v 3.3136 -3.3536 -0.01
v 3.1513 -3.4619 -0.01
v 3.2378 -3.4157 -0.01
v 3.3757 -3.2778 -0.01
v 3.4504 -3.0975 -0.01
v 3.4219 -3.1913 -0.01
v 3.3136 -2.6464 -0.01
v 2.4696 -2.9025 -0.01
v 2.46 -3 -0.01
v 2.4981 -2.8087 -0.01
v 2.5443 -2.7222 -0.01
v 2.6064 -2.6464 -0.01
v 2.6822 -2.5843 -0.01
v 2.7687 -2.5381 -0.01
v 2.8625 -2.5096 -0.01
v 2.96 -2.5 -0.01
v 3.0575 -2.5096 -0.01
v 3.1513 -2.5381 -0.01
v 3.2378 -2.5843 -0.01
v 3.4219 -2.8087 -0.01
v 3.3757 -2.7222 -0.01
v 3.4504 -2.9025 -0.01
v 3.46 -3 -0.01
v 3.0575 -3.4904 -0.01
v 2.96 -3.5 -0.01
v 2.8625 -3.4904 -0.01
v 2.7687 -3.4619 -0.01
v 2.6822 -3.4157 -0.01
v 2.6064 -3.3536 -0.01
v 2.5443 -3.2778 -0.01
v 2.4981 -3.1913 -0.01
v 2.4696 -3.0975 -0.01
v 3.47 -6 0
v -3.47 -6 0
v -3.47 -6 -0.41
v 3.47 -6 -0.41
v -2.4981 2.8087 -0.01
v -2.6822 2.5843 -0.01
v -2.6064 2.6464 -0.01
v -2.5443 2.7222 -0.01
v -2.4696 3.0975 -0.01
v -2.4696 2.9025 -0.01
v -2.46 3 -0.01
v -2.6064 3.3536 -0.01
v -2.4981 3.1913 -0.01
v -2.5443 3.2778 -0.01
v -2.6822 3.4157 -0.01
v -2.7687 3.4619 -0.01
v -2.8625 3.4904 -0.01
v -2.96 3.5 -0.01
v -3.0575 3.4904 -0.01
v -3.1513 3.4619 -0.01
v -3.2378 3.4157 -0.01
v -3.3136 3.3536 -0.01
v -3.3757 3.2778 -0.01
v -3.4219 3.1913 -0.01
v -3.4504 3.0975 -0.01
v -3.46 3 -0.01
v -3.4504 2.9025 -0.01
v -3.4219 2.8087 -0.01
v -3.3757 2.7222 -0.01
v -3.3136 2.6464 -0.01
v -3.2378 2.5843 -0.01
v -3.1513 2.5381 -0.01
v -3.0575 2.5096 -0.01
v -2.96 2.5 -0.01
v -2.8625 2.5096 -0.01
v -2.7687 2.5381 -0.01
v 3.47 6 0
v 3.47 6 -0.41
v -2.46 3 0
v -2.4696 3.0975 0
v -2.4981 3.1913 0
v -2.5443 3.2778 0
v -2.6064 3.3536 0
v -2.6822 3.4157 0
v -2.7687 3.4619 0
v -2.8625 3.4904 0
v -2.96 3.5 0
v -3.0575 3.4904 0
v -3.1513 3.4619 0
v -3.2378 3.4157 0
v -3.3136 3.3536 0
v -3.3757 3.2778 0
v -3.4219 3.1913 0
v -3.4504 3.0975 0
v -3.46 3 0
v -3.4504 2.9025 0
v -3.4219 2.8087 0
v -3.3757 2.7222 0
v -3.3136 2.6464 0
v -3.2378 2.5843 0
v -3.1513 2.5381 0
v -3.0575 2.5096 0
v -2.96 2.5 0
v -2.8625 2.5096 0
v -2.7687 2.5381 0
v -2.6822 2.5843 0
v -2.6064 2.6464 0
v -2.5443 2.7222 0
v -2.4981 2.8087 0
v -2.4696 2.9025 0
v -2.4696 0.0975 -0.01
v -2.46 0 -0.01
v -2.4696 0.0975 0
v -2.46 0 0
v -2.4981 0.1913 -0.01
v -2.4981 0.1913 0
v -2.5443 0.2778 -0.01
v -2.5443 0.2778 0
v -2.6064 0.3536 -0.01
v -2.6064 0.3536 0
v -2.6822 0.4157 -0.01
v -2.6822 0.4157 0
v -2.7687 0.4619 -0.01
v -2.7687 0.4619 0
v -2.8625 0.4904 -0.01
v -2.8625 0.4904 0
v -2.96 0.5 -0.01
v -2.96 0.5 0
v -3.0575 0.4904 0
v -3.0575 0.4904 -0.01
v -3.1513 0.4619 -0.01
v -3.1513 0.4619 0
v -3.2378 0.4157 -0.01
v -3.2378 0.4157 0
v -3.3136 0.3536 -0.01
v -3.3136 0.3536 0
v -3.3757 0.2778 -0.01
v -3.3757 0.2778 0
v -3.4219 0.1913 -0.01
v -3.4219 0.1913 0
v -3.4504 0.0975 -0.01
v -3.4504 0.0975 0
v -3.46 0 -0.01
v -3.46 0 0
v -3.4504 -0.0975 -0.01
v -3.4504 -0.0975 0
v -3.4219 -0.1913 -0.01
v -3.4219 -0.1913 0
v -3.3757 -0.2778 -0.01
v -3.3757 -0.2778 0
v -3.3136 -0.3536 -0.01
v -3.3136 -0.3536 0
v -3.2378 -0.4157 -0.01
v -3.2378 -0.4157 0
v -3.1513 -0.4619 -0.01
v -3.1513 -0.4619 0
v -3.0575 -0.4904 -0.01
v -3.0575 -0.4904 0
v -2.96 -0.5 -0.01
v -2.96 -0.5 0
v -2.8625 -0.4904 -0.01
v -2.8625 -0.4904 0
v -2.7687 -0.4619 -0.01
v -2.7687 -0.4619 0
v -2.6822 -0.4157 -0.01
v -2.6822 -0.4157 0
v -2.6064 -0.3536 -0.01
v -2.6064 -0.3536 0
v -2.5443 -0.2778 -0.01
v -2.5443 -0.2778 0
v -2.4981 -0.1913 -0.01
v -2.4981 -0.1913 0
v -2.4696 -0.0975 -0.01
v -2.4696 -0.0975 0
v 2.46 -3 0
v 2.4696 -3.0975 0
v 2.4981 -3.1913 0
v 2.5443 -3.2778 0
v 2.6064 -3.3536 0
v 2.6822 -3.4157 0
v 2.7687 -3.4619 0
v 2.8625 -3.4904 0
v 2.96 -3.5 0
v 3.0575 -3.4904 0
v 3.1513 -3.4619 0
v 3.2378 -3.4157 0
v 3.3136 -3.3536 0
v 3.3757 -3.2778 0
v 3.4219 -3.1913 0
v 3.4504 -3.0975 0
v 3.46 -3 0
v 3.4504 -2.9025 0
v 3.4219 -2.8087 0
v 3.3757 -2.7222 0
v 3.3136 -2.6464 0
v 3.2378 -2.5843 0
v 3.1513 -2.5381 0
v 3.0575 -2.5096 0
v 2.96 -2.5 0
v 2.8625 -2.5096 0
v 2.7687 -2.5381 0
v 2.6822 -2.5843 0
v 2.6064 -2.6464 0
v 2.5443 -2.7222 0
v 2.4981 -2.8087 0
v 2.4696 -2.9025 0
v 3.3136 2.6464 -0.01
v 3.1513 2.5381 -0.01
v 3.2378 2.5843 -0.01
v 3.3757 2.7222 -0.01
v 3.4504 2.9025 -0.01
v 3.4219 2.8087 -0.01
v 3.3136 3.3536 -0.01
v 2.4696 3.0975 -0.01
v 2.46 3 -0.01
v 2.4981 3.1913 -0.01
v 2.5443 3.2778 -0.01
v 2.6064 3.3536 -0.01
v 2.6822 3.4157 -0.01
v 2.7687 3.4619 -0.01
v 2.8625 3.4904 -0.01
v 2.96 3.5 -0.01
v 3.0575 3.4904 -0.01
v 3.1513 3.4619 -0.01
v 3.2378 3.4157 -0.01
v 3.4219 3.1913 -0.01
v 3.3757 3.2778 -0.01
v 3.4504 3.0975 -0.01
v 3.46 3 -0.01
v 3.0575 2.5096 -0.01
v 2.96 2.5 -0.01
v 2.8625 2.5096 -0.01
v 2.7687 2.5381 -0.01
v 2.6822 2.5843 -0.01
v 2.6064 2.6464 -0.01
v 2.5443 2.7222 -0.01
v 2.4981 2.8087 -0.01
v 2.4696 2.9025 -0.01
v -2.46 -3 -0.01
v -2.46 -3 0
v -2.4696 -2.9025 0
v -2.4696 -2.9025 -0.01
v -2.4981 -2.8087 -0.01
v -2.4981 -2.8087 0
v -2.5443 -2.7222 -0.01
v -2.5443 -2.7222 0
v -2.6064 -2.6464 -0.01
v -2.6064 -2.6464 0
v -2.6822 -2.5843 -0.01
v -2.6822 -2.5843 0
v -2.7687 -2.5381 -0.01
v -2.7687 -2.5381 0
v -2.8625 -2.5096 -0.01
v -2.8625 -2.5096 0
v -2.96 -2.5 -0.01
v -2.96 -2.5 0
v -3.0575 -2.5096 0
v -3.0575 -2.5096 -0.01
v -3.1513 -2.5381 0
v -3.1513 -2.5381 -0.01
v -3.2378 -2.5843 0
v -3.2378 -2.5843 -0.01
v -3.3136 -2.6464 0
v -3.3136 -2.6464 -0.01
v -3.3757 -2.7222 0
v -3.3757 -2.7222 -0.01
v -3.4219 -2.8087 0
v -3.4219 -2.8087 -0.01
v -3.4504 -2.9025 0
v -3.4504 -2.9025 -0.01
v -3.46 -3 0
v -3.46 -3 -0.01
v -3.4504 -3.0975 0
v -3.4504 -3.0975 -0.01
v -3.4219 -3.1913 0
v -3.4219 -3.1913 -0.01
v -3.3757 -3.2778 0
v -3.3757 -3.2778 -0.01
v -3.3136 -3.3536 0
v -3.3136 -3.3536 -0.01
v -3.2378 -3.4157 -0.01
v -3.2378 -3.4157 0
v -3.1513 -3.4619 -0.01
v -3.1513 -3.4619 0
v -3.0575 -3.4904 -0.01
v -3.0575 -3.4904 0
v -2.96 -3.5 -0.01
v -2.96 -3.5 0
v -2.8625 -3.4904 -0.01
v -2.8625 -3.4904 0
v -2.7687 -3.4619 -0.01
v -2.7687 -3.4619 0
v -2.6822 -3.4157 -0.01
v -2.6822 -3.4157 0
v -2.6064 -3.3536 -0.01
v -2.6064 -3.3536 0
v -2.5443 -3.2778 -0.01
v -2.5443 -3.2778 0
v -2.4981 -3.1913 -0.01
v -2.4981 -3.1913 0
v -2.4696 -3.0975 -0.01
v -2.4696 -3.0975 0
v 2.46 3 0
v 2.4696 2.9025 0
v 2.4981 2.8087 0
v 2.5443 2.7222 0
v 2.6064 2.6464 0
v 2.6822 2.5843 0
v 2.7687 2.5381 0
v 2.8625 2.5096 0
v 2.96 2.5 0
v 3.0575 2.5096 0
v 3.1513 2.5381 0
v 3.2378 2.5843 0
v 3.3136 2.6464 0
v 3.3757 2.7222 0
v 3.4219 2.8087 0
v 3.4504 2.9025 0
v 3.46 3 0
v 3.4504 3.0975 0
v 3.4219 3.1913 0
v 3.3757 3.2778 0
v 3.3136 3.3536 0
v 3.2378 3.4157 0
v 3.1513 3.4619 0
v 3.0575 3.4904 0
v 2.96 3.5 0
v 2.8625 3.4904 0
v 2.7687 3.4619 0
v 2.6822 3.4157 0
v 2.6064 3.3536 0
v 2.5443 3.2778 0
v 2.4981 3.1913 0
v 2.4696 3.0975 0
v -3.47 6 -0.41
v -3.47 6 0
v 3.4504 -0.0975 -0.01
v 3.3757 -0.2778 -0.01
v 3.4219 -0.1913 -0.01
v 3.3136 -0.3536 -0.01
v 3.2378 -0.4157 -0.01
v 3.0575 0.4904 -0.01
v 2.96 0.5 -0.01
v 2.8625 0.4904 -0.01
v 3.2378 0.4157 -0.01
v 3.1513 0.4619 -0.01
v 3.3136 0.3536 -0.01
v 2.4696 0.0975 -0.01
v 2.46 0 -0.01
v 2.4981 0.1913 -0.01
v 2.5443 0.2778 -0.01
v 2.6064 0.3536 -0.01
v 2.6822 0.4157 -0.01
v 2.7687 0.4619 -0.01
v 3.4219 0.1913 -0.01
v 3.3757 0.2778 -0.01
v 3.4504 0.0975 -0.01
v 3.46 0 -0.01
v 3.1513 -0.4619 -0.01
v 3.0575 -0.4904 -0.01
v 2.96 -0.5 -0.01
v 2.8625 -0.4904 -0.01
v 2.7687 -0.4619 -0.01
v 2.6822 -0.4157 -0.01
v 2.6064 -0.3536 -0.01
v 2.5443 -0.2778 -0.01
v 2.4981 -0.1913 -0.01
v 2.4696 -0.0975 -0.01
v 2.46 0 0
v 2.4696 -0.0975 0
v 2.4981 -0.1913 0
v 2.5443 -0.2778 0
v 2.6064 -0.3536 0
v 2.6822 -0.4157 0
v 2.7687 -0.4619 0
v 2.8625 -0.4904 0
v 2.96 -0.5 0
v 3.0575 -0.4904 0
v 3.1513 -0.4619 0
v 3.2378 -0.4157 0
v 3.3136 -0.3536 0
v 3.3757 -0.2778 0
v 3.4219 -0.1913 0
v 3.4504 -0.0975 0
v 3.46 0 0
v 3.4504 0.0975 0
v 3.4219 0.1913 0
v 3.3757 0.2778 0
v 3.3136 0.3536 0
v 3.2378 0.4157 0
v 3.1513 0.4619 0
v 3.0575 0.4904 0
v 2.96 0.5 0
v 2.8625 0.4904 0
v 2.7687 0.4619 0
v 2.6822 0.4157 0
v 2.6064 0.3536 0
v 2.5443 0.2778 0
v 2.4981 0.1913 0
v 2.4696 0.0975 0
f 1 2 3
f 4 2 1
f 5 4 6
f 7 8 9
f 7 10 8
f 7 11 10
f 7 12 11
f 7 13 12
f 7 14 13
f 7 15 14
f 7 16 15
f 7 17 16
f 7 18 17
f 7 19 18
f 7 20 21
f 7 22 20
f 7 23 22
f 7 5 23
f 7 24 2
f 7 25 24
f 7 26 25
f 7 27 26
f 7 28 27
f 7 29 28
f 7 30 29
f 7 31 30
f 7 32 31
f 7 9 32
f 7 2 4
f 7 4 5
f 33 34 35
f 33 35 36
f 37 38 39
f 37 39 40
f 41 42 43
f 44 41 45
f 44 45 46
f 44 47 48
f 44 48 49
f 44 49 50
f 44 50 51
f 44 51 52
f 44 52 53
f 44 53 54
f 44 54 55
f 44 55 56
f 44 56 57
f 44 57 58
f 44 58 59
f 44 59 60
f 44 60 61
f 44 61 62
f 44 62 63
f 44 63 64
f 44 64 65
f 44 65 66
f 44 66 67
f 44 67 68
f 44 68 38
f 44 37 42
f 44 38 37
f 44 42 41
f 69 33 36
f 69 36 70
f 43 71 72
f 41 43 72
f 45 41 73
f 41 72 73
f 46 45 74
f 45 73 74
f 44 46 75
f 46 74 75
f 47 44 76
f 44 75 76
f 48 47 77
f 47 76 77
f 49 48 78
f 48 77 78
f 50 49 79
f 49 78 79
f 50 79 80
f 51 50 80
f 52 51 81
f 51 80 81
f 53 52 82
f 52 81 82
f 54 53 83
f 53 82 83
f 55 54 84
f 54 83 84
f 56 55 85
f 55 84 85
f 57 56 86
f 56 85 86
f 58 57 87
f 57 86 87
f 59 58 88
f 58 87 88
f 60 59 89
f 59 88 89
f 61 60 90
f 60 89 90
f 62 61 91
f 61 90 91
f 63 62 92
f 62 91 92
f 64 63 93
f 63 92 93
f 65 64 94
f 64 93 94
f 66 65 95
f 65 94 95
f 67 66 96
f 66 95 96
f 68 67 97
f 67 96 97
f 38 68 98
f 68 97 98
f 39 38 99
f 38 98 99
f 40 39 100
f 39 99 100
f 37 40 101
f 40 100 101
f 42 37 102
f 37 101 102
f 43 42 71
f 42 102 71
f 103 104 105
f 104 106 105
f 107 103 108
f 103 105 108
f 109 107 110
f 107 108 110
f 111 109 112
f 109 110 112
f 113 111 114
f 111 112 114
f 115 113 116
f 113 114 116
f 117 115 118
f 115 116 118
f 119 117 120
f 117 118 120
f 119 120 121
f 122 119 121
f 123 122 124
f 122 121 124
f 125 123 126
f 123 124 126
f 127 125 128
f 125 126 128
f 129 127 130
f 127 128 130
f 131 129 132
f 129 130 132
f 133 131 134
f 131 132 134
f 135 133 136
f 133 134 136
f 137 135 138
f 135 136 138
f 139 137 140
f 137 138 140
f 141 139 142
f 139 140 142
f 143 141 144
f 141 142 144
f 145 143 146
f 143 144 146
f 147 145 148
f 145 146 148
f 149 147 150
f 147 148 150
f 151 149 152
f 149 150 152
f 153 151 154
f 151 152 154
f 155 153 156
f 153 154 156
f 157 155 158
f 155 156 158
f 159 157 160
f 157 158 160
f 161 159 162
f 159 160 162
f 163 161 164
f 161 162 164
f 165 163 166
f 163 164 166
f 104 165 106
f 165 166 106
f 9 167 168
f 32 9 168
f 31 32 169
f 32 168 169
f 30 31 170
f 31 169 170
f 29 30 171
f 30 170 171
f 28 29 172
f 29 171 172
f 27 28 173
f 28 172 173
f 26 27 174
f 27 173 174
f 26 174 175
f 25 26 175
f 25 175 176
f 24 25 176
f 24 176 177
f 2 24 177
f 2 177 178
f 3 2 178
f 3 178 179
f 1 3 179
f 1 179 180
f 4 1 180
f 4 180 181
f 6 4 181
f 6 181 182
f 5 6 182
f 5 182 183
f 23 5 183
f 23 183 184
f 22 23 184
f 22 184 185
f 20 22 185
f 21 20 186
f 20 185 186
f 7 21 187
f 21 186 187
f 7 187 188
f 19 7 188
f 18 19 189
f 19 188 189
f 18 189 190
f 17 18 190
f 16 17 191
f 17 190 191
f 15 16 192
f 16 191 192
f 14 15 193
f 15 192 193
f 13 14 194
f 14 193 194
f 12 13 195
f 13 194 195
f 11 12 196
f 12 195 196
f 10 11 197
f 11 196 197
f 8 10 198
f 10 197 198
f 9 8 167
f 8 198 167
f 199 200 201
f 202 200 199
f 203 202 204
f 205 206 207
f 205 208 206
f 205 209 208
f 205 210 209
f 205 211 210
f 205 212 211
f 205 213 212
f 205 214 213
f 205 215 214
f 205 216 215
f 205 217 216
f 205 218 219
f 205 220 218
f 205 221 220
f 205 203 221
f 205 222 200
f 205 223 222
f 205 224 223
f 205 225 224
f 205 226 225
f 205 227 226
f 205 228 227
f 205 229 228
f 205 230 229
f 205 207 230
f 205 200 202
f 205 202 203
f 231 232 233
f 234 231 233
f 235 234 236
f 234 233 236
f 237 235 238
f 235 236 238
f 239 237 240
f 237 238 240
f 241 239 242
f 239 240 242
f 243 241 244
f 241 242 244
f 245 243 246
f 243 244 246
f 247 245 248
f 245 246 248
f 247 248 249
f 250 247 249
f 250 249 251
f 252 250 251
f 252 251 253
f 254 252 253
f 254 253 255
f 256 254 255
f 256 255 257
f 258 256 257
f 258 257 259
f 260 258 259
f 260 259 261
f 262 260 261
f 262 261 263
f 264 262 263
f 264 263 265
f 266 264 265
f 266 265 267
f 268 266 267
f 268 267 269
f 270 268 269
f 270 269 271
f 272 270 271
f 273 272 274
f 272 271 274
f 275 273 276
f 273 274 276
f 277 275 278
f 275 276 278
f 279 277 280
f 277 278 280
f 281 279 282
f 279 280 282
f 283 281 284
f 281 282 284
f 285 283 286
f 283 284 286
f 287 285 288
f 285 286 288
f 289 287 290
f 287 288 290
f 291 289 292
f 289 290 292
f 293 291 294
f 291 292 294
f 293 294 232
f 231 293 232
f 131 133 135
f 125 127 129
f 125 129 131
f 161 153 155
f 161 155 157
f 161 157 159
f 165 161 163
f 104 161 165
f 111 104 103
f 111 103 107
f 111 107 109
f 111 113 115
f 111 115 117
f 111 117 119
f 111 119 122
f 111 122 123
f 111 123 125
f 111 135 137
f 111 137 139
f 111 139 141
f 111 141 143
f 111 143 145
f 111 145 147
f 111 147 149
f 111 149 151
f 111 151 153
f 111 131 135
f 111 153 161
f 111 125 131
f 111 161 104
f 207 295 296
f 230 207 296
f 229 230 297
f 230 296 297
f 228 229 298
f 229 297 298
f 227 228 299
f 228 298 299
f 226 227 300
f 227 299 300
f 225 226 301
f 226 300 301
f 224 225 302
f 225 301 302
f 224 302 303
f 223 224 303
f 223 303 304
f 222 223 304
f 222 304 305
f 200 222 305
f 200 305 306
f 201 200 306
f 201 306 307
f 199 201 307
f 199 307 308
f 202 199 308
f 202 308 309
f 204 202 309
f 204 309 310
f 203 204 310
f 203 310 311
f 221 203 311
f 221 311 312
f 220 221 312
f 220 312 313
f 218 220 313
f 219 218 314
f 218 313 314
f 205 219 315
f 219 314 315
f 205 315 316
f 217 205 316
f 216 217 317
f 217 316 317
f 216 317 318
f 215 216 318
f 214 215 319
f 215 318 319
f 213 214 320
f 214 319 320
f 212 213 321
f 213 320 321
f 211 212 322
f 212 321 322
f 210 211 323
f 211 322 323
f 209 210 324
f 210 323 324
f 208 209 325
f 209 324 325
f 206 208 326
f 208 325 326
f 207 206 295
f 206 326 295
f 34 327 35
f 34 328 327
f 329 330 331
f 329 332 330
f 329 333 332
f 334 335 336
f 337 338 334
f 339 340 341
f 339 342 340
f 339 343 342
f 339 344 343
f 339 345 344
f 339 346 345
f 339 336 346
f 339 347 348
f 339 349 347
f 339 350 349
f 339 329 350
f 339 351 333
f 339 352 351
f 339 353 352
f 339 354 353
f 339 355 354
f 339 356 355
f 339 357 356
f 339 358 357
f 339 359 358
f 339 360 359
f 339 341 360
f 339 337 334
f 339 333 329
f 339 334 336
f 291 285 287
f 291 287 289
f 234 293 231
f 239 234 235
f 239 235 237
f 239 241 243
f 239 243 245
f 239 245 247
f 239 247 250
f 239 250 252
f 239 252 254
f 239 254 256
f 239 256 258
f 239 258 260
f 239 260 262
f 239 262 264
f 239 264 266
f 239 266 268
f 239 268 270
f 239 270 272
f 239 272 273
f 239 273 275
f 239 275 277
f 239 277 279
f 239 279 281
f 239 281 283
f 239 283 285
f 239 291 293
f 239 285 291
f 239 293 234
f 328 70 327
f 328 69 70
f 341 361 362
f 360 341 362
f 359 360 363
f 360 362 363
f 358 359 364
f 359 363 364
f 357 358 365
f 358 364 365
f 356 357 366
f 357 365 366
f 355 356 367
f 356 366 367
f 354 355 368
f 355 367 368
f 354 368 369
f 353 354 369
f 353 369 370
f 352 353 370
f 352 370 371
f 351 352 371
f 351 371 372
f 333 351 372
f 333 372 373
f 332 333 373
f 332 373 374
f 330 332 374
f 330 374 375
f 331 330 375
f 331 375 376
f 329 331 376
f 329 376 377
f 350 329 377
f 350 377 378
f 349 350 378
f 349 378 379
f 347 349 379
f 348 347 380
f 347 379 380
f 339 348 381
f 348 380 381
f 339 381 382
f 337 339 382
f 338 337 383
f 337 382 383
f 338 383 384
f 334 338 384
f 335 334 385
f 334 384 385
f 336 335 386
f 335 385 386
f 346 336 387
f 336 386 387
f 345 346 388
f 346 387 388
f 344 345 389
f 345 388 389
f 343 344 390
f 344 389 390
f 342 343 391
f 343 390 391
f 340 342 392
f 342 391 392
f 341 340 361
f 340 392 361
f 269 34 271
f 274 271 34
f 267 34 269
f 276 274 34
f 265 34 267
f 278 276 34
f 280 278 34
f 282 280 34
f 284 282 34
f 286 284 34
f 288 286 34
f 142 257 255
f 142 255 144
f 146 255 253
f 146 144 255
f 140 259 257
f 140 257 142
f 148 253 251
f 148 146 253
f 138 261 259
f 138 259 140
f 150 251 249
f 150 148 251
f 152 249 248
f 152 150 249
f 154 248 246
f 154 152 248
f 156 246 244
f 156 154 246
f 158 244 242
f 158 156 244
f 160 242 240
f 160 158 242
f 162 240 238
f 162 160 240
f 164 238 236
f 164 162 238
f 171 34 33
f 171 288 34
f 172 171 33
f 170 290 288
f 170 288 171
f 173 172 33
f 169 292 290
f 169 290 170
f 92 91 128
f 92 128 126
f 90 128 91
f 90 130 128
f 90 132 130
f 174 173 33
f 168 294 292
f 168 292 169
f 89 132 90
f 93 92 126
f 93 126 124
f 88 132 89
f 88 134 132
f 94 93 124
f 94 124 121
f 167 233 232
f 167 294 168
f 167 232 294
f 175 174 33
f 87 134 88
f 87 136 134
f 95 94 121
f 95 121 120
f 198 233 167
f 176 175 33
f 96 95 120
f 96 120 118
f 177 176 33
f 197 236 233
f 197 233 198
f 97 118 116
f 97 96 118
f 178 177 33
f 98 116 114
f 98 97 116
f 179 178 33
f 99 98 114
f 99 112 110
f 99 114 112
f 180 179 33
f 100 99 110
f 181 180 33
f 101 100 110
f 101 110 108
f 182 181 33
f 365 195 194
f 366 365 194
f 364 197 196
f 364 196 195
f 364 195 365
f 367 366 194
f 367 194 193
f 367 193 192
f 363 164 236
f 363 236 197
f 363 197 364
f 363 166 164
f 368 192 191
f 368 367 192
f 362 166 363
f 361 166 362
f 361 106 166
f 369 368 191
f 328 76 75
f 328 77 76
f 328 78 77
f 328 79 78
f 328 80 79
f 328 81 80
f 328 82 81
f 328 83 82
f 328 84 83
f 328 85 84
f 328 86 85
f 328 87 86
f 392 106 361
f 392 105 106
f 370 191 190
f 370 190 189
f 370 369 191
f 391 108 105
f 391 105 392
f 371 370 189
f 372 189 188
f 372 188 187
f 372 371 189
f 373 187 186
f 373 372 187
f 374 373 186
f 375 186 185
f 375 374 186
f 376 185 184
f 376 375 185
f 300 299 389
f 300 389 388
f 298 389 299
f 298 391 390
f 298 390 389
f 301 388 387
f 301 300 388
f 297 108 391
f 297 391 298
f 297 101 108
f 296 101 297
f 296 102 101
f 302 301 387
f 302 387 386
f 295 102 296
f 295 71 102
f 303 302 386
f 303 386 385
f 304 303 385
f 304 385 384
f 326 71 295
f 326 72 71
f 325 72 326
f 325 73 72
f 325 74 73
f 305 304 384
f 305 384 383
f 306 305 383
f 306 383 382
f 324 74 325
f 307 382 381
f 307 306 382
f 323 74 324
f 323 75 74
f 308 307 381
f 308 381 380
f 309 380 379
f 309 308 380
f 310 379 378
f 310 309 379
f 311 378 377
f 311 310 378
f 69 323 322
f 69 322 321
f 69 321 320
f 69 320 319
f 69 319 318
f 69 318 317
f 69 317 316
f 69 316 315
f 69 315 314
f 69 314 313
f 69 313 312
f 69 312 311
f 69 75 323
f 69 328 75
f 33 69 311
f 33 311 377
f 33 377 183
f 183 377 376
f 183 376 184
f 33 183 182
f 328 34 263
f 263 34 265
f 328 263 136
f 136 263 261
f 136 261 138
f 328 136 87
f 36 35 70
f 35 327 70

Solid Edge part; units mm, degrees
sketch "Sketch1" plane through (0, 0, 0) normal (0, 0, 1) x (1, 0, 0)
  line L0 (-3.47, -6) -> (3.47, -6)
  line L1 (3.47, -6) -> (3.47, 6)
  line L2 (3.47, 6) -> (-3.47, 6)
  line L3 (-3.47, 6) -> (-3.47, -6)
  dimension "D1" = 6.94
  dimension "D2" = 12
extrude "Protrusion1" add sketch "Sketch1" against normal blind 0.41
sketch "Sketch2" plane through (0, 0, 0) normal (0, 0, 1) x (1, 0, 0)
  circle A0 centre (-2.96, 3) radius 0.5
  circle A1 centre (-2.96, 0) radius 0.5
  circle A2 centre (-2.96, -3) radius 0.5
  dimension "D1" = 6
  dimension "D2" = 1
  dimension "D3" = 1
  dimension "D4" = 1
  dimension "D5" = 0.51
  dimension "D6" = 3
  dimension "D7" = 3
extrude "Extrusionsausschnitt_1" cut sketch "Sketch2" against normal blind 0.01
mirror "Mirror1" about plane through (0, 0, 0) normal (1, 0, 0) of "Extrusionsausschnitt_1"
